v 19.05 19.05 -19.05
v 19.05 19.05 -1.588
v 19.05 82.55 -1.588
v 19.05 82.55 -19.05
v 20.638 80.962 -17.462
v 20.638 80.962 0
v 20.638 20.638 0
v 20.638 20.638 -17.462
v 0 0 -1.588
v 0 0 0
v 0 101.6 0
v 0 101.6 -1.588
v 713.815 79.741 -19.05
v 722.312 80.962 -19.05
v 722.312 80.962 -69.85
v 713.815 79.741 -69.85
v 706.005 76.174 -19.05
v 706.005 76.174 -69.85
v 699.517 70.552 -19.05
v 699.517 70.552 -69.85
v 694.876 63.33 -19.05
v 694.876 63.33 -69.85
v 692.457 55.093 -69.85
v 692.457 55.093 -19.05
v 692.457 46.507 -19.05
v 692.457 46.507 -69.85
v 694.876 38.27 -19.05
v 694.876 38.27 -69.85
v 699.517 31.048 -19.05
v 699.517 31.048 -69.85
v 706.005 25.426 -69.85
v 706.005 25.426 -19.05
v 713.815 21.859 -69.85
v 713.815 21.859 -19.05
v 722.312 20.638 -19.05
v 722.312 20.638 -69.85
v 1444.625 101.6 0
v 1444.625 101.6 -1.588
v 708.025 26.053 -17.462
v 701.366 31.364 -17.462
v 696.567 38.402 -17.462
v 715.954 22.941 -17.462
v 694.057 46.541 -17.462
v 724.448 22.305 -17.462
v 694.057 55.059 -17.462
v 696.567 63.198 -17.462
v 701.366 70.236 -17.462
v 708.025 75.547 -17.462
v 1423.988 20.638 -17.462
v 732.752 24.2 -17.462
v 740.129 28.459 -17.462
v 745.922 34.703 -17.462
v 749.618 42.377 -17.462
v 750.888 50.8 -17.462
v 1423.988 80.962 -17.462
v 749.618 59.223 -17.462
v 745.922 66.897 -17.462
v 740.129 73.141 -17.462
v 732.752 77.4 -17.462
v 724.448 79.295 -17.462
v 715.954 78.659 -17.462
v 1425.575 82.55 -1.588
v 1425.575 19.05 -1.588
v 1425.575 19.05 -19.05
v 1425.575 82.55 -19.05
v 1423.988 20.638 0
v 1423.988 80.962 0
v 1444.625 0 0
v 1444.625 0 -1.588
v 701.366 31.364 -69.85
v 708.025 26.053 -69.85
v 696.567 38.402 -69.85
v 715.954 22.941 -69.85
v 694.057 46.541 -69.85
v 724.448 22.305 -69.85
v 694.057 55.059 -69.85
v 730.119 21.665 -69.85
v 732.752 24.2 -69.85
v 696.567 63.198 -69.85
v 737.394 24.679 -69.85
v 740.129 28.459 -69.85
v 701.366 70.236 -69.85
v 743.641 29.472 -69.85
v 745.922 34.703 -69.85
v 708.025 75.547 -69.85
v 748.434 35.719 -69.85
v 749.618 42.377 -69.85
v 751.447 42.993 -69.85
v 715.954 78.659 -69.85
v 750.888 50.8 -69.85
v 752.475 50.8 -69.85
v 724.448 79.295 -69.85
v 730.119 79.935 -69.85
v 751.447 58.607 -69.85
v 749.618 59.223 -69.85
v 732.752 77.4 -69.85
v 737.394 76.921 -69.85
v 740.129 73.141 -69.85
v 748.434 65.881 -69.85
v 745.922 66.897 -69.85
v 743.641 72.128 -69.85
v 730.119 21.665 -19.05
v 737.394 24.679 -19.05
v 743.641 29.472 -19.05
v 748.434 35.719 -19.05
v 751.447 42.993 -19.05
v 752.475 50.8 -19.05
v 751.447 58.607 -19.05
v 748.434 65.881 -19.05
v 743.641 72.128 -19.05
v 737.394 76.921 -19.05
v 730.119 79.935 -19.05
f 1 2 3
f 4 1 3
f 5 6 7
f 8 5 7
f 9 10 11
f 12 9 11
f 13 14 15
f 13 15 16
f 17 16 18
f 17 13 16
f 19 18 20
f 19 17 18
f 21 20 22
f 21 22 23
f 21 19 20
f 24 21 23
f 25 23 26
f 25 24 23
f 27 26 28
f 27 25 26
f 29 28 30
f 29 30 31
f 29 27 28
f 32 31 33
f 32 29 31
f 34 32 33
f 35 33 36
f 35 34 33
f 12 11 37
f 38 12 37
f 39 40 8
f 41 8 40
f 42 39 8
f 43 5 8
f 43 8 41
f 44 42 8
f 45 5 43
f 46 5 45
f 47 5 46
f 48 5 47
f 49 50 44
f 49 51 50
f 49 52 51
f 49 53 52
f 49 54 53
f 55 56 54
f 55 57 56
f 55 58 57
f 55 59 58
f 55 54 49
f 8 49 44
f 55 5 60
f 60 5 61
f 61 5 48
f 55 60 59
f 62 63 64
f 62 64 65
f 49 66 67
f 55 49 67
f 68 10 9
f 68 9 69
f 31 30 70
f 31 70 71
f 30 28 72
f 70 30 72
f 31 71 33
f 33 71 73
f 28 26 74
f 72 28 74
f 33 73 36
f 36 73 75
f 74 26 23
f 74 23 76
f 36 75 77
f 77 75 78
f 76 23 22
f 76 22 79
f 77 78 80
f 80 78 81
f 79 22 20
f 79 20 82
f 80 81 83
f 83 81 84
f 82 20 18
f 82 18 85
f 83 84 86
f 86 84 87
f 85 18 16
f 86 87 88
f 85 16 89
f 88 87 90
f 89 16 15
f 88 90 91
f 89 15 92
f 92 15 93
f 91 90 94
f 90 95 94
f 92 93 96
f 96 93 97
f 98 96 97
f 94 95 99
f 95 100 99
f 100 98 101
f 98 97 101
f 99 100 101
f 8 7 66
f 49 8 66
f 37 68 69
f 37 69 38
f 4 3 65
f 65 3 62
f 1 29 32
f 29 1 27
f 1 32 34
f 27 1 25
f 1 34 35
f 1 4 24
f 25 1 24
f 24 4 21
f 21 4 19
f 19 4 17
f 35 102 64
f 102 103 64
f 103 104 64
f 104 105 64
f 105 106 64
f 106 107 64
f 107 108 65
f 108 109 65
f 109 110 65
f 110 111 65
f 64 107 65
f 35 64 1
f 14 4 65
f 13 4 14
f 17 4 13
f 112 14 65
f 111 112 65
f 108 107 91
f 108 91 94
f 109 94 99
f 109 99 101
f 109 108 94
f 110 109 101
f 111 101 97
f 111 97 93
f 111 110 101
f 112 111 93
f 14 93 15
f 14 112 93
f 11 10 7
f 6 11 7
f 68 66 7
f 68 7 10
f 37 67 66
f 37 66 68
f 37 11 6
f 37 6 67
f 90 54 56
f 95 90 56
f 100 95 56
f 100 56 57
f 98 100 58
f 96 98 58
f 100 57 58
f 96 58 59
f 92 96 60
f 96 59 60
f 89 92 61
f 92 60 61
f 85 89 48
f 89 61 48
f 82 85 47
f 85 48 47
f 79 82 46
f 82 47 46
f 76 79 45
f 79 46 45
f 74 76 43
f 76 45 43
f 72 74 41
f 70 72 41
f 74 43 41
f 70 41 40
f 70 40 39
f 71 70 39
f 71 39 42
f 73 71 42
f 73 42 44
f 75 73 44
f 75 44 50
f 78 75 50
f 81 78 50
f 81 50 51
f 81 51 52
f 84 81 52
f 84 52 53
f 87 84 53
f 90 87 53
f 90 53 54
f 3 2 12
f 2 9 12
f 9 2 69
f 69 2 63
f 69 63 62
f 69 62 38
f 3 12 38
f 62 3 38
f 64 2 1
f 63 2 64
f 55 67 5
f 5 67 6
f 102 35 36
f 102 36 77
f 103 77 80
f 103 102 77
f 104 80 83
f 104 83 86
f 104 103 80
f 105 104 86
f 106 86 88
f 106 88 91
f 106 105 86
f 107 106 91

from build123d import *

# Parameters (mm, degrees)
F0_W     = 1406.525
F0_H     = 63.5
F0_W_2   = 1444.625
F0_H_2   = 101.6
F1_DEPTH = 1.5875
F0_R     = 28.575
F2_DEPTH = 19.05
F3_DEPTH = 69.85
F4_DEPTH = 17.4625
F5_DEPTH = 69.851


with BuildPart() as f1:
    # F0 (on Top) → F1 (new body)
    with BuildSketch(Plane.XY):
        with Locations((722.3125, 50.8)):
            Rectangle(F0_W, F0_H)
        Polygon((20.6375, 80.9625), (722.3125, 80.9625), (1423.9875, 80.9625), (1423.9875, 20.6375), (722.3125, 20.6375), (20.6375, 20.6375), align=None, mode=Mode.SUBTRACT)
        with Locations((722.3125, 50.8)):
            Rectangle(F0_W_2, F0_H_2)
        with Locations((722.3125, 50.8)):
            Rectangle(F0_W, F0_H, mode=Mode.SUBTRACT)
    extrude(amount=-F1_DEPTH)

    # F0 (on Top) → F2 (join)
    with BuildSketch(Plane.XY):
        with Locations((722.3125, 50.8)):
            Rectangle(F0_W, F0_H)
        Polygon((20.6375, 80.9625), (722.3125, 80.9625), (1423.9875, 80.9625), (1423.9875, 20.6375), (722.3125, 20.6375), (20.6375, 20.6375), align=None, mode=Mode.SUBTRACT)
        with BuildLine():
            ThreePointArc((722.3125, 20.6375), (692.15, 50.8), (722.3125, 80.9625))
            Line((722.3125, 80.9625), (20.6375, 80.9625))
            Line((20.6375, 80.9625), (20.6375, 20.6375))
            Line((20.6375, 20.6375), (722.3125, 20.6375))
        make_face()
        with BuildLine():
            ThreePointArc((722.3125, 80.9625), (743.640608, 72.128108), (752.475, 50.8))
            ThreePointArc((752.475, 50.8), (743.640608, 29.471892), (722.3125, 20.6375))
            Line((722.3125, 20.6375), (1423.9875, 20.6375))
            Line((1423.9875, 20.6375), (1423.9875, 80.9625))
            Line((1423.9875, 80.9625), (722.3125, 80.9625))
        make_face()
        with BuildLine():
            ThreePointArc((722.3125, 20.6375), (743.640608, 29.471892), (752.475, 50.8))
            ThreePointArc((752.475, 50.8), (743.640608, 72.128108), (722.3125, 80.9625))
            ThreePointArc((722.3125, 80.9625), (692.15, 50.8), (722.3125, 20.6375))
        make_face()
        with Locations((722.3125, 50.8)):
            Circle(F0_R, mode=Mode.SUBTRACT)
        with Locations((722.3125, 50.8)):
            Circle(F0_R)
    extrude(amount=-F2_DEPTH)

    # F0 (on Top) → F3 (join)
    with BuildSketch(Plane.XY):
        with BuildLine():
            ThreePointArc((722.3125, 20.6375), (743.640608, 29.471892), (752.475, 50.8))
            ThreePointArc((752.475, 50.8), (743.640608, 72.128108), (722.3125, 80.9625))
            ThreePointArc((722.3125, 80.9625), (692.15, 50.8), (722.3125, 20.6375))
        make_face()
        with Locations((722.3125, 50.8)):
            Circle(F0_R, mode=Mode.SUBTRACT)
    extrude(amount=-F3_DEPTH)

    # F0 (on Top) → F4 (cut)
    with BuildSketch(Plane.XY):
        with BuildLine():
            ThreePointArc((722.3125, 20.6375), (692.15, 50.8), (722.3125, 80.9625))
            Line((722.3125, 80.9625), (20.6375, 80.9625))
            Line((20.6375, 80.9625), (20.6375, 20.6375))
            Line((20.6375, 20.6375), (722.3125, 20.6375))
        make_face()
        with BuildLine():
            ThreePointArc((722.3125, 80.9625), (743.640608, 72.128108), (752.475, 50.8))
            ThreePointArc((752.475, 50.8), (743.640608, 29.471892), (722.3125, 20.6375))
            Line((722.3125, 20.6375), (1423.9875, 20.6375))
            Line((1423.9875, 20.6375), (1423.9875, 80.9625))
            Line((1423.9875, 80.9625), (722.3125, 80.9625))
        make_face()
        with BuildLine():
            ThreePointArc((722.3125, 20.6375), (743.640608, 29.471892), (752.475, 50.8))
            ThreePointArc((752.475, 50.8), (743.640608, 72.128108), (722.3125, 80.9625))
            ThreePointArc((722.3125, 80.9625), (692.15, 50.8), (722.3125, 20.6375))
        make_face()
        with Locations((722.3125, 50.8)):
            Circle(F0_R, mode=Mode.SUBTRACT)
        with Locations((722.3125, 50.8)):
            Circle(F0_R)
    extrude(amount=-F4_DEPTH, mode=Mode.SUBTRACT)

    # F0 (on Top) → F5 (cut, through all)
    with BuildSketch(Plane.XY):
        with Locations((722.3125, 50.8)):
            Circle(F0_R)
    extrude(amount=-F5_DEPTH, mode=Mode.SUBTRACT)


solid = f1.part
